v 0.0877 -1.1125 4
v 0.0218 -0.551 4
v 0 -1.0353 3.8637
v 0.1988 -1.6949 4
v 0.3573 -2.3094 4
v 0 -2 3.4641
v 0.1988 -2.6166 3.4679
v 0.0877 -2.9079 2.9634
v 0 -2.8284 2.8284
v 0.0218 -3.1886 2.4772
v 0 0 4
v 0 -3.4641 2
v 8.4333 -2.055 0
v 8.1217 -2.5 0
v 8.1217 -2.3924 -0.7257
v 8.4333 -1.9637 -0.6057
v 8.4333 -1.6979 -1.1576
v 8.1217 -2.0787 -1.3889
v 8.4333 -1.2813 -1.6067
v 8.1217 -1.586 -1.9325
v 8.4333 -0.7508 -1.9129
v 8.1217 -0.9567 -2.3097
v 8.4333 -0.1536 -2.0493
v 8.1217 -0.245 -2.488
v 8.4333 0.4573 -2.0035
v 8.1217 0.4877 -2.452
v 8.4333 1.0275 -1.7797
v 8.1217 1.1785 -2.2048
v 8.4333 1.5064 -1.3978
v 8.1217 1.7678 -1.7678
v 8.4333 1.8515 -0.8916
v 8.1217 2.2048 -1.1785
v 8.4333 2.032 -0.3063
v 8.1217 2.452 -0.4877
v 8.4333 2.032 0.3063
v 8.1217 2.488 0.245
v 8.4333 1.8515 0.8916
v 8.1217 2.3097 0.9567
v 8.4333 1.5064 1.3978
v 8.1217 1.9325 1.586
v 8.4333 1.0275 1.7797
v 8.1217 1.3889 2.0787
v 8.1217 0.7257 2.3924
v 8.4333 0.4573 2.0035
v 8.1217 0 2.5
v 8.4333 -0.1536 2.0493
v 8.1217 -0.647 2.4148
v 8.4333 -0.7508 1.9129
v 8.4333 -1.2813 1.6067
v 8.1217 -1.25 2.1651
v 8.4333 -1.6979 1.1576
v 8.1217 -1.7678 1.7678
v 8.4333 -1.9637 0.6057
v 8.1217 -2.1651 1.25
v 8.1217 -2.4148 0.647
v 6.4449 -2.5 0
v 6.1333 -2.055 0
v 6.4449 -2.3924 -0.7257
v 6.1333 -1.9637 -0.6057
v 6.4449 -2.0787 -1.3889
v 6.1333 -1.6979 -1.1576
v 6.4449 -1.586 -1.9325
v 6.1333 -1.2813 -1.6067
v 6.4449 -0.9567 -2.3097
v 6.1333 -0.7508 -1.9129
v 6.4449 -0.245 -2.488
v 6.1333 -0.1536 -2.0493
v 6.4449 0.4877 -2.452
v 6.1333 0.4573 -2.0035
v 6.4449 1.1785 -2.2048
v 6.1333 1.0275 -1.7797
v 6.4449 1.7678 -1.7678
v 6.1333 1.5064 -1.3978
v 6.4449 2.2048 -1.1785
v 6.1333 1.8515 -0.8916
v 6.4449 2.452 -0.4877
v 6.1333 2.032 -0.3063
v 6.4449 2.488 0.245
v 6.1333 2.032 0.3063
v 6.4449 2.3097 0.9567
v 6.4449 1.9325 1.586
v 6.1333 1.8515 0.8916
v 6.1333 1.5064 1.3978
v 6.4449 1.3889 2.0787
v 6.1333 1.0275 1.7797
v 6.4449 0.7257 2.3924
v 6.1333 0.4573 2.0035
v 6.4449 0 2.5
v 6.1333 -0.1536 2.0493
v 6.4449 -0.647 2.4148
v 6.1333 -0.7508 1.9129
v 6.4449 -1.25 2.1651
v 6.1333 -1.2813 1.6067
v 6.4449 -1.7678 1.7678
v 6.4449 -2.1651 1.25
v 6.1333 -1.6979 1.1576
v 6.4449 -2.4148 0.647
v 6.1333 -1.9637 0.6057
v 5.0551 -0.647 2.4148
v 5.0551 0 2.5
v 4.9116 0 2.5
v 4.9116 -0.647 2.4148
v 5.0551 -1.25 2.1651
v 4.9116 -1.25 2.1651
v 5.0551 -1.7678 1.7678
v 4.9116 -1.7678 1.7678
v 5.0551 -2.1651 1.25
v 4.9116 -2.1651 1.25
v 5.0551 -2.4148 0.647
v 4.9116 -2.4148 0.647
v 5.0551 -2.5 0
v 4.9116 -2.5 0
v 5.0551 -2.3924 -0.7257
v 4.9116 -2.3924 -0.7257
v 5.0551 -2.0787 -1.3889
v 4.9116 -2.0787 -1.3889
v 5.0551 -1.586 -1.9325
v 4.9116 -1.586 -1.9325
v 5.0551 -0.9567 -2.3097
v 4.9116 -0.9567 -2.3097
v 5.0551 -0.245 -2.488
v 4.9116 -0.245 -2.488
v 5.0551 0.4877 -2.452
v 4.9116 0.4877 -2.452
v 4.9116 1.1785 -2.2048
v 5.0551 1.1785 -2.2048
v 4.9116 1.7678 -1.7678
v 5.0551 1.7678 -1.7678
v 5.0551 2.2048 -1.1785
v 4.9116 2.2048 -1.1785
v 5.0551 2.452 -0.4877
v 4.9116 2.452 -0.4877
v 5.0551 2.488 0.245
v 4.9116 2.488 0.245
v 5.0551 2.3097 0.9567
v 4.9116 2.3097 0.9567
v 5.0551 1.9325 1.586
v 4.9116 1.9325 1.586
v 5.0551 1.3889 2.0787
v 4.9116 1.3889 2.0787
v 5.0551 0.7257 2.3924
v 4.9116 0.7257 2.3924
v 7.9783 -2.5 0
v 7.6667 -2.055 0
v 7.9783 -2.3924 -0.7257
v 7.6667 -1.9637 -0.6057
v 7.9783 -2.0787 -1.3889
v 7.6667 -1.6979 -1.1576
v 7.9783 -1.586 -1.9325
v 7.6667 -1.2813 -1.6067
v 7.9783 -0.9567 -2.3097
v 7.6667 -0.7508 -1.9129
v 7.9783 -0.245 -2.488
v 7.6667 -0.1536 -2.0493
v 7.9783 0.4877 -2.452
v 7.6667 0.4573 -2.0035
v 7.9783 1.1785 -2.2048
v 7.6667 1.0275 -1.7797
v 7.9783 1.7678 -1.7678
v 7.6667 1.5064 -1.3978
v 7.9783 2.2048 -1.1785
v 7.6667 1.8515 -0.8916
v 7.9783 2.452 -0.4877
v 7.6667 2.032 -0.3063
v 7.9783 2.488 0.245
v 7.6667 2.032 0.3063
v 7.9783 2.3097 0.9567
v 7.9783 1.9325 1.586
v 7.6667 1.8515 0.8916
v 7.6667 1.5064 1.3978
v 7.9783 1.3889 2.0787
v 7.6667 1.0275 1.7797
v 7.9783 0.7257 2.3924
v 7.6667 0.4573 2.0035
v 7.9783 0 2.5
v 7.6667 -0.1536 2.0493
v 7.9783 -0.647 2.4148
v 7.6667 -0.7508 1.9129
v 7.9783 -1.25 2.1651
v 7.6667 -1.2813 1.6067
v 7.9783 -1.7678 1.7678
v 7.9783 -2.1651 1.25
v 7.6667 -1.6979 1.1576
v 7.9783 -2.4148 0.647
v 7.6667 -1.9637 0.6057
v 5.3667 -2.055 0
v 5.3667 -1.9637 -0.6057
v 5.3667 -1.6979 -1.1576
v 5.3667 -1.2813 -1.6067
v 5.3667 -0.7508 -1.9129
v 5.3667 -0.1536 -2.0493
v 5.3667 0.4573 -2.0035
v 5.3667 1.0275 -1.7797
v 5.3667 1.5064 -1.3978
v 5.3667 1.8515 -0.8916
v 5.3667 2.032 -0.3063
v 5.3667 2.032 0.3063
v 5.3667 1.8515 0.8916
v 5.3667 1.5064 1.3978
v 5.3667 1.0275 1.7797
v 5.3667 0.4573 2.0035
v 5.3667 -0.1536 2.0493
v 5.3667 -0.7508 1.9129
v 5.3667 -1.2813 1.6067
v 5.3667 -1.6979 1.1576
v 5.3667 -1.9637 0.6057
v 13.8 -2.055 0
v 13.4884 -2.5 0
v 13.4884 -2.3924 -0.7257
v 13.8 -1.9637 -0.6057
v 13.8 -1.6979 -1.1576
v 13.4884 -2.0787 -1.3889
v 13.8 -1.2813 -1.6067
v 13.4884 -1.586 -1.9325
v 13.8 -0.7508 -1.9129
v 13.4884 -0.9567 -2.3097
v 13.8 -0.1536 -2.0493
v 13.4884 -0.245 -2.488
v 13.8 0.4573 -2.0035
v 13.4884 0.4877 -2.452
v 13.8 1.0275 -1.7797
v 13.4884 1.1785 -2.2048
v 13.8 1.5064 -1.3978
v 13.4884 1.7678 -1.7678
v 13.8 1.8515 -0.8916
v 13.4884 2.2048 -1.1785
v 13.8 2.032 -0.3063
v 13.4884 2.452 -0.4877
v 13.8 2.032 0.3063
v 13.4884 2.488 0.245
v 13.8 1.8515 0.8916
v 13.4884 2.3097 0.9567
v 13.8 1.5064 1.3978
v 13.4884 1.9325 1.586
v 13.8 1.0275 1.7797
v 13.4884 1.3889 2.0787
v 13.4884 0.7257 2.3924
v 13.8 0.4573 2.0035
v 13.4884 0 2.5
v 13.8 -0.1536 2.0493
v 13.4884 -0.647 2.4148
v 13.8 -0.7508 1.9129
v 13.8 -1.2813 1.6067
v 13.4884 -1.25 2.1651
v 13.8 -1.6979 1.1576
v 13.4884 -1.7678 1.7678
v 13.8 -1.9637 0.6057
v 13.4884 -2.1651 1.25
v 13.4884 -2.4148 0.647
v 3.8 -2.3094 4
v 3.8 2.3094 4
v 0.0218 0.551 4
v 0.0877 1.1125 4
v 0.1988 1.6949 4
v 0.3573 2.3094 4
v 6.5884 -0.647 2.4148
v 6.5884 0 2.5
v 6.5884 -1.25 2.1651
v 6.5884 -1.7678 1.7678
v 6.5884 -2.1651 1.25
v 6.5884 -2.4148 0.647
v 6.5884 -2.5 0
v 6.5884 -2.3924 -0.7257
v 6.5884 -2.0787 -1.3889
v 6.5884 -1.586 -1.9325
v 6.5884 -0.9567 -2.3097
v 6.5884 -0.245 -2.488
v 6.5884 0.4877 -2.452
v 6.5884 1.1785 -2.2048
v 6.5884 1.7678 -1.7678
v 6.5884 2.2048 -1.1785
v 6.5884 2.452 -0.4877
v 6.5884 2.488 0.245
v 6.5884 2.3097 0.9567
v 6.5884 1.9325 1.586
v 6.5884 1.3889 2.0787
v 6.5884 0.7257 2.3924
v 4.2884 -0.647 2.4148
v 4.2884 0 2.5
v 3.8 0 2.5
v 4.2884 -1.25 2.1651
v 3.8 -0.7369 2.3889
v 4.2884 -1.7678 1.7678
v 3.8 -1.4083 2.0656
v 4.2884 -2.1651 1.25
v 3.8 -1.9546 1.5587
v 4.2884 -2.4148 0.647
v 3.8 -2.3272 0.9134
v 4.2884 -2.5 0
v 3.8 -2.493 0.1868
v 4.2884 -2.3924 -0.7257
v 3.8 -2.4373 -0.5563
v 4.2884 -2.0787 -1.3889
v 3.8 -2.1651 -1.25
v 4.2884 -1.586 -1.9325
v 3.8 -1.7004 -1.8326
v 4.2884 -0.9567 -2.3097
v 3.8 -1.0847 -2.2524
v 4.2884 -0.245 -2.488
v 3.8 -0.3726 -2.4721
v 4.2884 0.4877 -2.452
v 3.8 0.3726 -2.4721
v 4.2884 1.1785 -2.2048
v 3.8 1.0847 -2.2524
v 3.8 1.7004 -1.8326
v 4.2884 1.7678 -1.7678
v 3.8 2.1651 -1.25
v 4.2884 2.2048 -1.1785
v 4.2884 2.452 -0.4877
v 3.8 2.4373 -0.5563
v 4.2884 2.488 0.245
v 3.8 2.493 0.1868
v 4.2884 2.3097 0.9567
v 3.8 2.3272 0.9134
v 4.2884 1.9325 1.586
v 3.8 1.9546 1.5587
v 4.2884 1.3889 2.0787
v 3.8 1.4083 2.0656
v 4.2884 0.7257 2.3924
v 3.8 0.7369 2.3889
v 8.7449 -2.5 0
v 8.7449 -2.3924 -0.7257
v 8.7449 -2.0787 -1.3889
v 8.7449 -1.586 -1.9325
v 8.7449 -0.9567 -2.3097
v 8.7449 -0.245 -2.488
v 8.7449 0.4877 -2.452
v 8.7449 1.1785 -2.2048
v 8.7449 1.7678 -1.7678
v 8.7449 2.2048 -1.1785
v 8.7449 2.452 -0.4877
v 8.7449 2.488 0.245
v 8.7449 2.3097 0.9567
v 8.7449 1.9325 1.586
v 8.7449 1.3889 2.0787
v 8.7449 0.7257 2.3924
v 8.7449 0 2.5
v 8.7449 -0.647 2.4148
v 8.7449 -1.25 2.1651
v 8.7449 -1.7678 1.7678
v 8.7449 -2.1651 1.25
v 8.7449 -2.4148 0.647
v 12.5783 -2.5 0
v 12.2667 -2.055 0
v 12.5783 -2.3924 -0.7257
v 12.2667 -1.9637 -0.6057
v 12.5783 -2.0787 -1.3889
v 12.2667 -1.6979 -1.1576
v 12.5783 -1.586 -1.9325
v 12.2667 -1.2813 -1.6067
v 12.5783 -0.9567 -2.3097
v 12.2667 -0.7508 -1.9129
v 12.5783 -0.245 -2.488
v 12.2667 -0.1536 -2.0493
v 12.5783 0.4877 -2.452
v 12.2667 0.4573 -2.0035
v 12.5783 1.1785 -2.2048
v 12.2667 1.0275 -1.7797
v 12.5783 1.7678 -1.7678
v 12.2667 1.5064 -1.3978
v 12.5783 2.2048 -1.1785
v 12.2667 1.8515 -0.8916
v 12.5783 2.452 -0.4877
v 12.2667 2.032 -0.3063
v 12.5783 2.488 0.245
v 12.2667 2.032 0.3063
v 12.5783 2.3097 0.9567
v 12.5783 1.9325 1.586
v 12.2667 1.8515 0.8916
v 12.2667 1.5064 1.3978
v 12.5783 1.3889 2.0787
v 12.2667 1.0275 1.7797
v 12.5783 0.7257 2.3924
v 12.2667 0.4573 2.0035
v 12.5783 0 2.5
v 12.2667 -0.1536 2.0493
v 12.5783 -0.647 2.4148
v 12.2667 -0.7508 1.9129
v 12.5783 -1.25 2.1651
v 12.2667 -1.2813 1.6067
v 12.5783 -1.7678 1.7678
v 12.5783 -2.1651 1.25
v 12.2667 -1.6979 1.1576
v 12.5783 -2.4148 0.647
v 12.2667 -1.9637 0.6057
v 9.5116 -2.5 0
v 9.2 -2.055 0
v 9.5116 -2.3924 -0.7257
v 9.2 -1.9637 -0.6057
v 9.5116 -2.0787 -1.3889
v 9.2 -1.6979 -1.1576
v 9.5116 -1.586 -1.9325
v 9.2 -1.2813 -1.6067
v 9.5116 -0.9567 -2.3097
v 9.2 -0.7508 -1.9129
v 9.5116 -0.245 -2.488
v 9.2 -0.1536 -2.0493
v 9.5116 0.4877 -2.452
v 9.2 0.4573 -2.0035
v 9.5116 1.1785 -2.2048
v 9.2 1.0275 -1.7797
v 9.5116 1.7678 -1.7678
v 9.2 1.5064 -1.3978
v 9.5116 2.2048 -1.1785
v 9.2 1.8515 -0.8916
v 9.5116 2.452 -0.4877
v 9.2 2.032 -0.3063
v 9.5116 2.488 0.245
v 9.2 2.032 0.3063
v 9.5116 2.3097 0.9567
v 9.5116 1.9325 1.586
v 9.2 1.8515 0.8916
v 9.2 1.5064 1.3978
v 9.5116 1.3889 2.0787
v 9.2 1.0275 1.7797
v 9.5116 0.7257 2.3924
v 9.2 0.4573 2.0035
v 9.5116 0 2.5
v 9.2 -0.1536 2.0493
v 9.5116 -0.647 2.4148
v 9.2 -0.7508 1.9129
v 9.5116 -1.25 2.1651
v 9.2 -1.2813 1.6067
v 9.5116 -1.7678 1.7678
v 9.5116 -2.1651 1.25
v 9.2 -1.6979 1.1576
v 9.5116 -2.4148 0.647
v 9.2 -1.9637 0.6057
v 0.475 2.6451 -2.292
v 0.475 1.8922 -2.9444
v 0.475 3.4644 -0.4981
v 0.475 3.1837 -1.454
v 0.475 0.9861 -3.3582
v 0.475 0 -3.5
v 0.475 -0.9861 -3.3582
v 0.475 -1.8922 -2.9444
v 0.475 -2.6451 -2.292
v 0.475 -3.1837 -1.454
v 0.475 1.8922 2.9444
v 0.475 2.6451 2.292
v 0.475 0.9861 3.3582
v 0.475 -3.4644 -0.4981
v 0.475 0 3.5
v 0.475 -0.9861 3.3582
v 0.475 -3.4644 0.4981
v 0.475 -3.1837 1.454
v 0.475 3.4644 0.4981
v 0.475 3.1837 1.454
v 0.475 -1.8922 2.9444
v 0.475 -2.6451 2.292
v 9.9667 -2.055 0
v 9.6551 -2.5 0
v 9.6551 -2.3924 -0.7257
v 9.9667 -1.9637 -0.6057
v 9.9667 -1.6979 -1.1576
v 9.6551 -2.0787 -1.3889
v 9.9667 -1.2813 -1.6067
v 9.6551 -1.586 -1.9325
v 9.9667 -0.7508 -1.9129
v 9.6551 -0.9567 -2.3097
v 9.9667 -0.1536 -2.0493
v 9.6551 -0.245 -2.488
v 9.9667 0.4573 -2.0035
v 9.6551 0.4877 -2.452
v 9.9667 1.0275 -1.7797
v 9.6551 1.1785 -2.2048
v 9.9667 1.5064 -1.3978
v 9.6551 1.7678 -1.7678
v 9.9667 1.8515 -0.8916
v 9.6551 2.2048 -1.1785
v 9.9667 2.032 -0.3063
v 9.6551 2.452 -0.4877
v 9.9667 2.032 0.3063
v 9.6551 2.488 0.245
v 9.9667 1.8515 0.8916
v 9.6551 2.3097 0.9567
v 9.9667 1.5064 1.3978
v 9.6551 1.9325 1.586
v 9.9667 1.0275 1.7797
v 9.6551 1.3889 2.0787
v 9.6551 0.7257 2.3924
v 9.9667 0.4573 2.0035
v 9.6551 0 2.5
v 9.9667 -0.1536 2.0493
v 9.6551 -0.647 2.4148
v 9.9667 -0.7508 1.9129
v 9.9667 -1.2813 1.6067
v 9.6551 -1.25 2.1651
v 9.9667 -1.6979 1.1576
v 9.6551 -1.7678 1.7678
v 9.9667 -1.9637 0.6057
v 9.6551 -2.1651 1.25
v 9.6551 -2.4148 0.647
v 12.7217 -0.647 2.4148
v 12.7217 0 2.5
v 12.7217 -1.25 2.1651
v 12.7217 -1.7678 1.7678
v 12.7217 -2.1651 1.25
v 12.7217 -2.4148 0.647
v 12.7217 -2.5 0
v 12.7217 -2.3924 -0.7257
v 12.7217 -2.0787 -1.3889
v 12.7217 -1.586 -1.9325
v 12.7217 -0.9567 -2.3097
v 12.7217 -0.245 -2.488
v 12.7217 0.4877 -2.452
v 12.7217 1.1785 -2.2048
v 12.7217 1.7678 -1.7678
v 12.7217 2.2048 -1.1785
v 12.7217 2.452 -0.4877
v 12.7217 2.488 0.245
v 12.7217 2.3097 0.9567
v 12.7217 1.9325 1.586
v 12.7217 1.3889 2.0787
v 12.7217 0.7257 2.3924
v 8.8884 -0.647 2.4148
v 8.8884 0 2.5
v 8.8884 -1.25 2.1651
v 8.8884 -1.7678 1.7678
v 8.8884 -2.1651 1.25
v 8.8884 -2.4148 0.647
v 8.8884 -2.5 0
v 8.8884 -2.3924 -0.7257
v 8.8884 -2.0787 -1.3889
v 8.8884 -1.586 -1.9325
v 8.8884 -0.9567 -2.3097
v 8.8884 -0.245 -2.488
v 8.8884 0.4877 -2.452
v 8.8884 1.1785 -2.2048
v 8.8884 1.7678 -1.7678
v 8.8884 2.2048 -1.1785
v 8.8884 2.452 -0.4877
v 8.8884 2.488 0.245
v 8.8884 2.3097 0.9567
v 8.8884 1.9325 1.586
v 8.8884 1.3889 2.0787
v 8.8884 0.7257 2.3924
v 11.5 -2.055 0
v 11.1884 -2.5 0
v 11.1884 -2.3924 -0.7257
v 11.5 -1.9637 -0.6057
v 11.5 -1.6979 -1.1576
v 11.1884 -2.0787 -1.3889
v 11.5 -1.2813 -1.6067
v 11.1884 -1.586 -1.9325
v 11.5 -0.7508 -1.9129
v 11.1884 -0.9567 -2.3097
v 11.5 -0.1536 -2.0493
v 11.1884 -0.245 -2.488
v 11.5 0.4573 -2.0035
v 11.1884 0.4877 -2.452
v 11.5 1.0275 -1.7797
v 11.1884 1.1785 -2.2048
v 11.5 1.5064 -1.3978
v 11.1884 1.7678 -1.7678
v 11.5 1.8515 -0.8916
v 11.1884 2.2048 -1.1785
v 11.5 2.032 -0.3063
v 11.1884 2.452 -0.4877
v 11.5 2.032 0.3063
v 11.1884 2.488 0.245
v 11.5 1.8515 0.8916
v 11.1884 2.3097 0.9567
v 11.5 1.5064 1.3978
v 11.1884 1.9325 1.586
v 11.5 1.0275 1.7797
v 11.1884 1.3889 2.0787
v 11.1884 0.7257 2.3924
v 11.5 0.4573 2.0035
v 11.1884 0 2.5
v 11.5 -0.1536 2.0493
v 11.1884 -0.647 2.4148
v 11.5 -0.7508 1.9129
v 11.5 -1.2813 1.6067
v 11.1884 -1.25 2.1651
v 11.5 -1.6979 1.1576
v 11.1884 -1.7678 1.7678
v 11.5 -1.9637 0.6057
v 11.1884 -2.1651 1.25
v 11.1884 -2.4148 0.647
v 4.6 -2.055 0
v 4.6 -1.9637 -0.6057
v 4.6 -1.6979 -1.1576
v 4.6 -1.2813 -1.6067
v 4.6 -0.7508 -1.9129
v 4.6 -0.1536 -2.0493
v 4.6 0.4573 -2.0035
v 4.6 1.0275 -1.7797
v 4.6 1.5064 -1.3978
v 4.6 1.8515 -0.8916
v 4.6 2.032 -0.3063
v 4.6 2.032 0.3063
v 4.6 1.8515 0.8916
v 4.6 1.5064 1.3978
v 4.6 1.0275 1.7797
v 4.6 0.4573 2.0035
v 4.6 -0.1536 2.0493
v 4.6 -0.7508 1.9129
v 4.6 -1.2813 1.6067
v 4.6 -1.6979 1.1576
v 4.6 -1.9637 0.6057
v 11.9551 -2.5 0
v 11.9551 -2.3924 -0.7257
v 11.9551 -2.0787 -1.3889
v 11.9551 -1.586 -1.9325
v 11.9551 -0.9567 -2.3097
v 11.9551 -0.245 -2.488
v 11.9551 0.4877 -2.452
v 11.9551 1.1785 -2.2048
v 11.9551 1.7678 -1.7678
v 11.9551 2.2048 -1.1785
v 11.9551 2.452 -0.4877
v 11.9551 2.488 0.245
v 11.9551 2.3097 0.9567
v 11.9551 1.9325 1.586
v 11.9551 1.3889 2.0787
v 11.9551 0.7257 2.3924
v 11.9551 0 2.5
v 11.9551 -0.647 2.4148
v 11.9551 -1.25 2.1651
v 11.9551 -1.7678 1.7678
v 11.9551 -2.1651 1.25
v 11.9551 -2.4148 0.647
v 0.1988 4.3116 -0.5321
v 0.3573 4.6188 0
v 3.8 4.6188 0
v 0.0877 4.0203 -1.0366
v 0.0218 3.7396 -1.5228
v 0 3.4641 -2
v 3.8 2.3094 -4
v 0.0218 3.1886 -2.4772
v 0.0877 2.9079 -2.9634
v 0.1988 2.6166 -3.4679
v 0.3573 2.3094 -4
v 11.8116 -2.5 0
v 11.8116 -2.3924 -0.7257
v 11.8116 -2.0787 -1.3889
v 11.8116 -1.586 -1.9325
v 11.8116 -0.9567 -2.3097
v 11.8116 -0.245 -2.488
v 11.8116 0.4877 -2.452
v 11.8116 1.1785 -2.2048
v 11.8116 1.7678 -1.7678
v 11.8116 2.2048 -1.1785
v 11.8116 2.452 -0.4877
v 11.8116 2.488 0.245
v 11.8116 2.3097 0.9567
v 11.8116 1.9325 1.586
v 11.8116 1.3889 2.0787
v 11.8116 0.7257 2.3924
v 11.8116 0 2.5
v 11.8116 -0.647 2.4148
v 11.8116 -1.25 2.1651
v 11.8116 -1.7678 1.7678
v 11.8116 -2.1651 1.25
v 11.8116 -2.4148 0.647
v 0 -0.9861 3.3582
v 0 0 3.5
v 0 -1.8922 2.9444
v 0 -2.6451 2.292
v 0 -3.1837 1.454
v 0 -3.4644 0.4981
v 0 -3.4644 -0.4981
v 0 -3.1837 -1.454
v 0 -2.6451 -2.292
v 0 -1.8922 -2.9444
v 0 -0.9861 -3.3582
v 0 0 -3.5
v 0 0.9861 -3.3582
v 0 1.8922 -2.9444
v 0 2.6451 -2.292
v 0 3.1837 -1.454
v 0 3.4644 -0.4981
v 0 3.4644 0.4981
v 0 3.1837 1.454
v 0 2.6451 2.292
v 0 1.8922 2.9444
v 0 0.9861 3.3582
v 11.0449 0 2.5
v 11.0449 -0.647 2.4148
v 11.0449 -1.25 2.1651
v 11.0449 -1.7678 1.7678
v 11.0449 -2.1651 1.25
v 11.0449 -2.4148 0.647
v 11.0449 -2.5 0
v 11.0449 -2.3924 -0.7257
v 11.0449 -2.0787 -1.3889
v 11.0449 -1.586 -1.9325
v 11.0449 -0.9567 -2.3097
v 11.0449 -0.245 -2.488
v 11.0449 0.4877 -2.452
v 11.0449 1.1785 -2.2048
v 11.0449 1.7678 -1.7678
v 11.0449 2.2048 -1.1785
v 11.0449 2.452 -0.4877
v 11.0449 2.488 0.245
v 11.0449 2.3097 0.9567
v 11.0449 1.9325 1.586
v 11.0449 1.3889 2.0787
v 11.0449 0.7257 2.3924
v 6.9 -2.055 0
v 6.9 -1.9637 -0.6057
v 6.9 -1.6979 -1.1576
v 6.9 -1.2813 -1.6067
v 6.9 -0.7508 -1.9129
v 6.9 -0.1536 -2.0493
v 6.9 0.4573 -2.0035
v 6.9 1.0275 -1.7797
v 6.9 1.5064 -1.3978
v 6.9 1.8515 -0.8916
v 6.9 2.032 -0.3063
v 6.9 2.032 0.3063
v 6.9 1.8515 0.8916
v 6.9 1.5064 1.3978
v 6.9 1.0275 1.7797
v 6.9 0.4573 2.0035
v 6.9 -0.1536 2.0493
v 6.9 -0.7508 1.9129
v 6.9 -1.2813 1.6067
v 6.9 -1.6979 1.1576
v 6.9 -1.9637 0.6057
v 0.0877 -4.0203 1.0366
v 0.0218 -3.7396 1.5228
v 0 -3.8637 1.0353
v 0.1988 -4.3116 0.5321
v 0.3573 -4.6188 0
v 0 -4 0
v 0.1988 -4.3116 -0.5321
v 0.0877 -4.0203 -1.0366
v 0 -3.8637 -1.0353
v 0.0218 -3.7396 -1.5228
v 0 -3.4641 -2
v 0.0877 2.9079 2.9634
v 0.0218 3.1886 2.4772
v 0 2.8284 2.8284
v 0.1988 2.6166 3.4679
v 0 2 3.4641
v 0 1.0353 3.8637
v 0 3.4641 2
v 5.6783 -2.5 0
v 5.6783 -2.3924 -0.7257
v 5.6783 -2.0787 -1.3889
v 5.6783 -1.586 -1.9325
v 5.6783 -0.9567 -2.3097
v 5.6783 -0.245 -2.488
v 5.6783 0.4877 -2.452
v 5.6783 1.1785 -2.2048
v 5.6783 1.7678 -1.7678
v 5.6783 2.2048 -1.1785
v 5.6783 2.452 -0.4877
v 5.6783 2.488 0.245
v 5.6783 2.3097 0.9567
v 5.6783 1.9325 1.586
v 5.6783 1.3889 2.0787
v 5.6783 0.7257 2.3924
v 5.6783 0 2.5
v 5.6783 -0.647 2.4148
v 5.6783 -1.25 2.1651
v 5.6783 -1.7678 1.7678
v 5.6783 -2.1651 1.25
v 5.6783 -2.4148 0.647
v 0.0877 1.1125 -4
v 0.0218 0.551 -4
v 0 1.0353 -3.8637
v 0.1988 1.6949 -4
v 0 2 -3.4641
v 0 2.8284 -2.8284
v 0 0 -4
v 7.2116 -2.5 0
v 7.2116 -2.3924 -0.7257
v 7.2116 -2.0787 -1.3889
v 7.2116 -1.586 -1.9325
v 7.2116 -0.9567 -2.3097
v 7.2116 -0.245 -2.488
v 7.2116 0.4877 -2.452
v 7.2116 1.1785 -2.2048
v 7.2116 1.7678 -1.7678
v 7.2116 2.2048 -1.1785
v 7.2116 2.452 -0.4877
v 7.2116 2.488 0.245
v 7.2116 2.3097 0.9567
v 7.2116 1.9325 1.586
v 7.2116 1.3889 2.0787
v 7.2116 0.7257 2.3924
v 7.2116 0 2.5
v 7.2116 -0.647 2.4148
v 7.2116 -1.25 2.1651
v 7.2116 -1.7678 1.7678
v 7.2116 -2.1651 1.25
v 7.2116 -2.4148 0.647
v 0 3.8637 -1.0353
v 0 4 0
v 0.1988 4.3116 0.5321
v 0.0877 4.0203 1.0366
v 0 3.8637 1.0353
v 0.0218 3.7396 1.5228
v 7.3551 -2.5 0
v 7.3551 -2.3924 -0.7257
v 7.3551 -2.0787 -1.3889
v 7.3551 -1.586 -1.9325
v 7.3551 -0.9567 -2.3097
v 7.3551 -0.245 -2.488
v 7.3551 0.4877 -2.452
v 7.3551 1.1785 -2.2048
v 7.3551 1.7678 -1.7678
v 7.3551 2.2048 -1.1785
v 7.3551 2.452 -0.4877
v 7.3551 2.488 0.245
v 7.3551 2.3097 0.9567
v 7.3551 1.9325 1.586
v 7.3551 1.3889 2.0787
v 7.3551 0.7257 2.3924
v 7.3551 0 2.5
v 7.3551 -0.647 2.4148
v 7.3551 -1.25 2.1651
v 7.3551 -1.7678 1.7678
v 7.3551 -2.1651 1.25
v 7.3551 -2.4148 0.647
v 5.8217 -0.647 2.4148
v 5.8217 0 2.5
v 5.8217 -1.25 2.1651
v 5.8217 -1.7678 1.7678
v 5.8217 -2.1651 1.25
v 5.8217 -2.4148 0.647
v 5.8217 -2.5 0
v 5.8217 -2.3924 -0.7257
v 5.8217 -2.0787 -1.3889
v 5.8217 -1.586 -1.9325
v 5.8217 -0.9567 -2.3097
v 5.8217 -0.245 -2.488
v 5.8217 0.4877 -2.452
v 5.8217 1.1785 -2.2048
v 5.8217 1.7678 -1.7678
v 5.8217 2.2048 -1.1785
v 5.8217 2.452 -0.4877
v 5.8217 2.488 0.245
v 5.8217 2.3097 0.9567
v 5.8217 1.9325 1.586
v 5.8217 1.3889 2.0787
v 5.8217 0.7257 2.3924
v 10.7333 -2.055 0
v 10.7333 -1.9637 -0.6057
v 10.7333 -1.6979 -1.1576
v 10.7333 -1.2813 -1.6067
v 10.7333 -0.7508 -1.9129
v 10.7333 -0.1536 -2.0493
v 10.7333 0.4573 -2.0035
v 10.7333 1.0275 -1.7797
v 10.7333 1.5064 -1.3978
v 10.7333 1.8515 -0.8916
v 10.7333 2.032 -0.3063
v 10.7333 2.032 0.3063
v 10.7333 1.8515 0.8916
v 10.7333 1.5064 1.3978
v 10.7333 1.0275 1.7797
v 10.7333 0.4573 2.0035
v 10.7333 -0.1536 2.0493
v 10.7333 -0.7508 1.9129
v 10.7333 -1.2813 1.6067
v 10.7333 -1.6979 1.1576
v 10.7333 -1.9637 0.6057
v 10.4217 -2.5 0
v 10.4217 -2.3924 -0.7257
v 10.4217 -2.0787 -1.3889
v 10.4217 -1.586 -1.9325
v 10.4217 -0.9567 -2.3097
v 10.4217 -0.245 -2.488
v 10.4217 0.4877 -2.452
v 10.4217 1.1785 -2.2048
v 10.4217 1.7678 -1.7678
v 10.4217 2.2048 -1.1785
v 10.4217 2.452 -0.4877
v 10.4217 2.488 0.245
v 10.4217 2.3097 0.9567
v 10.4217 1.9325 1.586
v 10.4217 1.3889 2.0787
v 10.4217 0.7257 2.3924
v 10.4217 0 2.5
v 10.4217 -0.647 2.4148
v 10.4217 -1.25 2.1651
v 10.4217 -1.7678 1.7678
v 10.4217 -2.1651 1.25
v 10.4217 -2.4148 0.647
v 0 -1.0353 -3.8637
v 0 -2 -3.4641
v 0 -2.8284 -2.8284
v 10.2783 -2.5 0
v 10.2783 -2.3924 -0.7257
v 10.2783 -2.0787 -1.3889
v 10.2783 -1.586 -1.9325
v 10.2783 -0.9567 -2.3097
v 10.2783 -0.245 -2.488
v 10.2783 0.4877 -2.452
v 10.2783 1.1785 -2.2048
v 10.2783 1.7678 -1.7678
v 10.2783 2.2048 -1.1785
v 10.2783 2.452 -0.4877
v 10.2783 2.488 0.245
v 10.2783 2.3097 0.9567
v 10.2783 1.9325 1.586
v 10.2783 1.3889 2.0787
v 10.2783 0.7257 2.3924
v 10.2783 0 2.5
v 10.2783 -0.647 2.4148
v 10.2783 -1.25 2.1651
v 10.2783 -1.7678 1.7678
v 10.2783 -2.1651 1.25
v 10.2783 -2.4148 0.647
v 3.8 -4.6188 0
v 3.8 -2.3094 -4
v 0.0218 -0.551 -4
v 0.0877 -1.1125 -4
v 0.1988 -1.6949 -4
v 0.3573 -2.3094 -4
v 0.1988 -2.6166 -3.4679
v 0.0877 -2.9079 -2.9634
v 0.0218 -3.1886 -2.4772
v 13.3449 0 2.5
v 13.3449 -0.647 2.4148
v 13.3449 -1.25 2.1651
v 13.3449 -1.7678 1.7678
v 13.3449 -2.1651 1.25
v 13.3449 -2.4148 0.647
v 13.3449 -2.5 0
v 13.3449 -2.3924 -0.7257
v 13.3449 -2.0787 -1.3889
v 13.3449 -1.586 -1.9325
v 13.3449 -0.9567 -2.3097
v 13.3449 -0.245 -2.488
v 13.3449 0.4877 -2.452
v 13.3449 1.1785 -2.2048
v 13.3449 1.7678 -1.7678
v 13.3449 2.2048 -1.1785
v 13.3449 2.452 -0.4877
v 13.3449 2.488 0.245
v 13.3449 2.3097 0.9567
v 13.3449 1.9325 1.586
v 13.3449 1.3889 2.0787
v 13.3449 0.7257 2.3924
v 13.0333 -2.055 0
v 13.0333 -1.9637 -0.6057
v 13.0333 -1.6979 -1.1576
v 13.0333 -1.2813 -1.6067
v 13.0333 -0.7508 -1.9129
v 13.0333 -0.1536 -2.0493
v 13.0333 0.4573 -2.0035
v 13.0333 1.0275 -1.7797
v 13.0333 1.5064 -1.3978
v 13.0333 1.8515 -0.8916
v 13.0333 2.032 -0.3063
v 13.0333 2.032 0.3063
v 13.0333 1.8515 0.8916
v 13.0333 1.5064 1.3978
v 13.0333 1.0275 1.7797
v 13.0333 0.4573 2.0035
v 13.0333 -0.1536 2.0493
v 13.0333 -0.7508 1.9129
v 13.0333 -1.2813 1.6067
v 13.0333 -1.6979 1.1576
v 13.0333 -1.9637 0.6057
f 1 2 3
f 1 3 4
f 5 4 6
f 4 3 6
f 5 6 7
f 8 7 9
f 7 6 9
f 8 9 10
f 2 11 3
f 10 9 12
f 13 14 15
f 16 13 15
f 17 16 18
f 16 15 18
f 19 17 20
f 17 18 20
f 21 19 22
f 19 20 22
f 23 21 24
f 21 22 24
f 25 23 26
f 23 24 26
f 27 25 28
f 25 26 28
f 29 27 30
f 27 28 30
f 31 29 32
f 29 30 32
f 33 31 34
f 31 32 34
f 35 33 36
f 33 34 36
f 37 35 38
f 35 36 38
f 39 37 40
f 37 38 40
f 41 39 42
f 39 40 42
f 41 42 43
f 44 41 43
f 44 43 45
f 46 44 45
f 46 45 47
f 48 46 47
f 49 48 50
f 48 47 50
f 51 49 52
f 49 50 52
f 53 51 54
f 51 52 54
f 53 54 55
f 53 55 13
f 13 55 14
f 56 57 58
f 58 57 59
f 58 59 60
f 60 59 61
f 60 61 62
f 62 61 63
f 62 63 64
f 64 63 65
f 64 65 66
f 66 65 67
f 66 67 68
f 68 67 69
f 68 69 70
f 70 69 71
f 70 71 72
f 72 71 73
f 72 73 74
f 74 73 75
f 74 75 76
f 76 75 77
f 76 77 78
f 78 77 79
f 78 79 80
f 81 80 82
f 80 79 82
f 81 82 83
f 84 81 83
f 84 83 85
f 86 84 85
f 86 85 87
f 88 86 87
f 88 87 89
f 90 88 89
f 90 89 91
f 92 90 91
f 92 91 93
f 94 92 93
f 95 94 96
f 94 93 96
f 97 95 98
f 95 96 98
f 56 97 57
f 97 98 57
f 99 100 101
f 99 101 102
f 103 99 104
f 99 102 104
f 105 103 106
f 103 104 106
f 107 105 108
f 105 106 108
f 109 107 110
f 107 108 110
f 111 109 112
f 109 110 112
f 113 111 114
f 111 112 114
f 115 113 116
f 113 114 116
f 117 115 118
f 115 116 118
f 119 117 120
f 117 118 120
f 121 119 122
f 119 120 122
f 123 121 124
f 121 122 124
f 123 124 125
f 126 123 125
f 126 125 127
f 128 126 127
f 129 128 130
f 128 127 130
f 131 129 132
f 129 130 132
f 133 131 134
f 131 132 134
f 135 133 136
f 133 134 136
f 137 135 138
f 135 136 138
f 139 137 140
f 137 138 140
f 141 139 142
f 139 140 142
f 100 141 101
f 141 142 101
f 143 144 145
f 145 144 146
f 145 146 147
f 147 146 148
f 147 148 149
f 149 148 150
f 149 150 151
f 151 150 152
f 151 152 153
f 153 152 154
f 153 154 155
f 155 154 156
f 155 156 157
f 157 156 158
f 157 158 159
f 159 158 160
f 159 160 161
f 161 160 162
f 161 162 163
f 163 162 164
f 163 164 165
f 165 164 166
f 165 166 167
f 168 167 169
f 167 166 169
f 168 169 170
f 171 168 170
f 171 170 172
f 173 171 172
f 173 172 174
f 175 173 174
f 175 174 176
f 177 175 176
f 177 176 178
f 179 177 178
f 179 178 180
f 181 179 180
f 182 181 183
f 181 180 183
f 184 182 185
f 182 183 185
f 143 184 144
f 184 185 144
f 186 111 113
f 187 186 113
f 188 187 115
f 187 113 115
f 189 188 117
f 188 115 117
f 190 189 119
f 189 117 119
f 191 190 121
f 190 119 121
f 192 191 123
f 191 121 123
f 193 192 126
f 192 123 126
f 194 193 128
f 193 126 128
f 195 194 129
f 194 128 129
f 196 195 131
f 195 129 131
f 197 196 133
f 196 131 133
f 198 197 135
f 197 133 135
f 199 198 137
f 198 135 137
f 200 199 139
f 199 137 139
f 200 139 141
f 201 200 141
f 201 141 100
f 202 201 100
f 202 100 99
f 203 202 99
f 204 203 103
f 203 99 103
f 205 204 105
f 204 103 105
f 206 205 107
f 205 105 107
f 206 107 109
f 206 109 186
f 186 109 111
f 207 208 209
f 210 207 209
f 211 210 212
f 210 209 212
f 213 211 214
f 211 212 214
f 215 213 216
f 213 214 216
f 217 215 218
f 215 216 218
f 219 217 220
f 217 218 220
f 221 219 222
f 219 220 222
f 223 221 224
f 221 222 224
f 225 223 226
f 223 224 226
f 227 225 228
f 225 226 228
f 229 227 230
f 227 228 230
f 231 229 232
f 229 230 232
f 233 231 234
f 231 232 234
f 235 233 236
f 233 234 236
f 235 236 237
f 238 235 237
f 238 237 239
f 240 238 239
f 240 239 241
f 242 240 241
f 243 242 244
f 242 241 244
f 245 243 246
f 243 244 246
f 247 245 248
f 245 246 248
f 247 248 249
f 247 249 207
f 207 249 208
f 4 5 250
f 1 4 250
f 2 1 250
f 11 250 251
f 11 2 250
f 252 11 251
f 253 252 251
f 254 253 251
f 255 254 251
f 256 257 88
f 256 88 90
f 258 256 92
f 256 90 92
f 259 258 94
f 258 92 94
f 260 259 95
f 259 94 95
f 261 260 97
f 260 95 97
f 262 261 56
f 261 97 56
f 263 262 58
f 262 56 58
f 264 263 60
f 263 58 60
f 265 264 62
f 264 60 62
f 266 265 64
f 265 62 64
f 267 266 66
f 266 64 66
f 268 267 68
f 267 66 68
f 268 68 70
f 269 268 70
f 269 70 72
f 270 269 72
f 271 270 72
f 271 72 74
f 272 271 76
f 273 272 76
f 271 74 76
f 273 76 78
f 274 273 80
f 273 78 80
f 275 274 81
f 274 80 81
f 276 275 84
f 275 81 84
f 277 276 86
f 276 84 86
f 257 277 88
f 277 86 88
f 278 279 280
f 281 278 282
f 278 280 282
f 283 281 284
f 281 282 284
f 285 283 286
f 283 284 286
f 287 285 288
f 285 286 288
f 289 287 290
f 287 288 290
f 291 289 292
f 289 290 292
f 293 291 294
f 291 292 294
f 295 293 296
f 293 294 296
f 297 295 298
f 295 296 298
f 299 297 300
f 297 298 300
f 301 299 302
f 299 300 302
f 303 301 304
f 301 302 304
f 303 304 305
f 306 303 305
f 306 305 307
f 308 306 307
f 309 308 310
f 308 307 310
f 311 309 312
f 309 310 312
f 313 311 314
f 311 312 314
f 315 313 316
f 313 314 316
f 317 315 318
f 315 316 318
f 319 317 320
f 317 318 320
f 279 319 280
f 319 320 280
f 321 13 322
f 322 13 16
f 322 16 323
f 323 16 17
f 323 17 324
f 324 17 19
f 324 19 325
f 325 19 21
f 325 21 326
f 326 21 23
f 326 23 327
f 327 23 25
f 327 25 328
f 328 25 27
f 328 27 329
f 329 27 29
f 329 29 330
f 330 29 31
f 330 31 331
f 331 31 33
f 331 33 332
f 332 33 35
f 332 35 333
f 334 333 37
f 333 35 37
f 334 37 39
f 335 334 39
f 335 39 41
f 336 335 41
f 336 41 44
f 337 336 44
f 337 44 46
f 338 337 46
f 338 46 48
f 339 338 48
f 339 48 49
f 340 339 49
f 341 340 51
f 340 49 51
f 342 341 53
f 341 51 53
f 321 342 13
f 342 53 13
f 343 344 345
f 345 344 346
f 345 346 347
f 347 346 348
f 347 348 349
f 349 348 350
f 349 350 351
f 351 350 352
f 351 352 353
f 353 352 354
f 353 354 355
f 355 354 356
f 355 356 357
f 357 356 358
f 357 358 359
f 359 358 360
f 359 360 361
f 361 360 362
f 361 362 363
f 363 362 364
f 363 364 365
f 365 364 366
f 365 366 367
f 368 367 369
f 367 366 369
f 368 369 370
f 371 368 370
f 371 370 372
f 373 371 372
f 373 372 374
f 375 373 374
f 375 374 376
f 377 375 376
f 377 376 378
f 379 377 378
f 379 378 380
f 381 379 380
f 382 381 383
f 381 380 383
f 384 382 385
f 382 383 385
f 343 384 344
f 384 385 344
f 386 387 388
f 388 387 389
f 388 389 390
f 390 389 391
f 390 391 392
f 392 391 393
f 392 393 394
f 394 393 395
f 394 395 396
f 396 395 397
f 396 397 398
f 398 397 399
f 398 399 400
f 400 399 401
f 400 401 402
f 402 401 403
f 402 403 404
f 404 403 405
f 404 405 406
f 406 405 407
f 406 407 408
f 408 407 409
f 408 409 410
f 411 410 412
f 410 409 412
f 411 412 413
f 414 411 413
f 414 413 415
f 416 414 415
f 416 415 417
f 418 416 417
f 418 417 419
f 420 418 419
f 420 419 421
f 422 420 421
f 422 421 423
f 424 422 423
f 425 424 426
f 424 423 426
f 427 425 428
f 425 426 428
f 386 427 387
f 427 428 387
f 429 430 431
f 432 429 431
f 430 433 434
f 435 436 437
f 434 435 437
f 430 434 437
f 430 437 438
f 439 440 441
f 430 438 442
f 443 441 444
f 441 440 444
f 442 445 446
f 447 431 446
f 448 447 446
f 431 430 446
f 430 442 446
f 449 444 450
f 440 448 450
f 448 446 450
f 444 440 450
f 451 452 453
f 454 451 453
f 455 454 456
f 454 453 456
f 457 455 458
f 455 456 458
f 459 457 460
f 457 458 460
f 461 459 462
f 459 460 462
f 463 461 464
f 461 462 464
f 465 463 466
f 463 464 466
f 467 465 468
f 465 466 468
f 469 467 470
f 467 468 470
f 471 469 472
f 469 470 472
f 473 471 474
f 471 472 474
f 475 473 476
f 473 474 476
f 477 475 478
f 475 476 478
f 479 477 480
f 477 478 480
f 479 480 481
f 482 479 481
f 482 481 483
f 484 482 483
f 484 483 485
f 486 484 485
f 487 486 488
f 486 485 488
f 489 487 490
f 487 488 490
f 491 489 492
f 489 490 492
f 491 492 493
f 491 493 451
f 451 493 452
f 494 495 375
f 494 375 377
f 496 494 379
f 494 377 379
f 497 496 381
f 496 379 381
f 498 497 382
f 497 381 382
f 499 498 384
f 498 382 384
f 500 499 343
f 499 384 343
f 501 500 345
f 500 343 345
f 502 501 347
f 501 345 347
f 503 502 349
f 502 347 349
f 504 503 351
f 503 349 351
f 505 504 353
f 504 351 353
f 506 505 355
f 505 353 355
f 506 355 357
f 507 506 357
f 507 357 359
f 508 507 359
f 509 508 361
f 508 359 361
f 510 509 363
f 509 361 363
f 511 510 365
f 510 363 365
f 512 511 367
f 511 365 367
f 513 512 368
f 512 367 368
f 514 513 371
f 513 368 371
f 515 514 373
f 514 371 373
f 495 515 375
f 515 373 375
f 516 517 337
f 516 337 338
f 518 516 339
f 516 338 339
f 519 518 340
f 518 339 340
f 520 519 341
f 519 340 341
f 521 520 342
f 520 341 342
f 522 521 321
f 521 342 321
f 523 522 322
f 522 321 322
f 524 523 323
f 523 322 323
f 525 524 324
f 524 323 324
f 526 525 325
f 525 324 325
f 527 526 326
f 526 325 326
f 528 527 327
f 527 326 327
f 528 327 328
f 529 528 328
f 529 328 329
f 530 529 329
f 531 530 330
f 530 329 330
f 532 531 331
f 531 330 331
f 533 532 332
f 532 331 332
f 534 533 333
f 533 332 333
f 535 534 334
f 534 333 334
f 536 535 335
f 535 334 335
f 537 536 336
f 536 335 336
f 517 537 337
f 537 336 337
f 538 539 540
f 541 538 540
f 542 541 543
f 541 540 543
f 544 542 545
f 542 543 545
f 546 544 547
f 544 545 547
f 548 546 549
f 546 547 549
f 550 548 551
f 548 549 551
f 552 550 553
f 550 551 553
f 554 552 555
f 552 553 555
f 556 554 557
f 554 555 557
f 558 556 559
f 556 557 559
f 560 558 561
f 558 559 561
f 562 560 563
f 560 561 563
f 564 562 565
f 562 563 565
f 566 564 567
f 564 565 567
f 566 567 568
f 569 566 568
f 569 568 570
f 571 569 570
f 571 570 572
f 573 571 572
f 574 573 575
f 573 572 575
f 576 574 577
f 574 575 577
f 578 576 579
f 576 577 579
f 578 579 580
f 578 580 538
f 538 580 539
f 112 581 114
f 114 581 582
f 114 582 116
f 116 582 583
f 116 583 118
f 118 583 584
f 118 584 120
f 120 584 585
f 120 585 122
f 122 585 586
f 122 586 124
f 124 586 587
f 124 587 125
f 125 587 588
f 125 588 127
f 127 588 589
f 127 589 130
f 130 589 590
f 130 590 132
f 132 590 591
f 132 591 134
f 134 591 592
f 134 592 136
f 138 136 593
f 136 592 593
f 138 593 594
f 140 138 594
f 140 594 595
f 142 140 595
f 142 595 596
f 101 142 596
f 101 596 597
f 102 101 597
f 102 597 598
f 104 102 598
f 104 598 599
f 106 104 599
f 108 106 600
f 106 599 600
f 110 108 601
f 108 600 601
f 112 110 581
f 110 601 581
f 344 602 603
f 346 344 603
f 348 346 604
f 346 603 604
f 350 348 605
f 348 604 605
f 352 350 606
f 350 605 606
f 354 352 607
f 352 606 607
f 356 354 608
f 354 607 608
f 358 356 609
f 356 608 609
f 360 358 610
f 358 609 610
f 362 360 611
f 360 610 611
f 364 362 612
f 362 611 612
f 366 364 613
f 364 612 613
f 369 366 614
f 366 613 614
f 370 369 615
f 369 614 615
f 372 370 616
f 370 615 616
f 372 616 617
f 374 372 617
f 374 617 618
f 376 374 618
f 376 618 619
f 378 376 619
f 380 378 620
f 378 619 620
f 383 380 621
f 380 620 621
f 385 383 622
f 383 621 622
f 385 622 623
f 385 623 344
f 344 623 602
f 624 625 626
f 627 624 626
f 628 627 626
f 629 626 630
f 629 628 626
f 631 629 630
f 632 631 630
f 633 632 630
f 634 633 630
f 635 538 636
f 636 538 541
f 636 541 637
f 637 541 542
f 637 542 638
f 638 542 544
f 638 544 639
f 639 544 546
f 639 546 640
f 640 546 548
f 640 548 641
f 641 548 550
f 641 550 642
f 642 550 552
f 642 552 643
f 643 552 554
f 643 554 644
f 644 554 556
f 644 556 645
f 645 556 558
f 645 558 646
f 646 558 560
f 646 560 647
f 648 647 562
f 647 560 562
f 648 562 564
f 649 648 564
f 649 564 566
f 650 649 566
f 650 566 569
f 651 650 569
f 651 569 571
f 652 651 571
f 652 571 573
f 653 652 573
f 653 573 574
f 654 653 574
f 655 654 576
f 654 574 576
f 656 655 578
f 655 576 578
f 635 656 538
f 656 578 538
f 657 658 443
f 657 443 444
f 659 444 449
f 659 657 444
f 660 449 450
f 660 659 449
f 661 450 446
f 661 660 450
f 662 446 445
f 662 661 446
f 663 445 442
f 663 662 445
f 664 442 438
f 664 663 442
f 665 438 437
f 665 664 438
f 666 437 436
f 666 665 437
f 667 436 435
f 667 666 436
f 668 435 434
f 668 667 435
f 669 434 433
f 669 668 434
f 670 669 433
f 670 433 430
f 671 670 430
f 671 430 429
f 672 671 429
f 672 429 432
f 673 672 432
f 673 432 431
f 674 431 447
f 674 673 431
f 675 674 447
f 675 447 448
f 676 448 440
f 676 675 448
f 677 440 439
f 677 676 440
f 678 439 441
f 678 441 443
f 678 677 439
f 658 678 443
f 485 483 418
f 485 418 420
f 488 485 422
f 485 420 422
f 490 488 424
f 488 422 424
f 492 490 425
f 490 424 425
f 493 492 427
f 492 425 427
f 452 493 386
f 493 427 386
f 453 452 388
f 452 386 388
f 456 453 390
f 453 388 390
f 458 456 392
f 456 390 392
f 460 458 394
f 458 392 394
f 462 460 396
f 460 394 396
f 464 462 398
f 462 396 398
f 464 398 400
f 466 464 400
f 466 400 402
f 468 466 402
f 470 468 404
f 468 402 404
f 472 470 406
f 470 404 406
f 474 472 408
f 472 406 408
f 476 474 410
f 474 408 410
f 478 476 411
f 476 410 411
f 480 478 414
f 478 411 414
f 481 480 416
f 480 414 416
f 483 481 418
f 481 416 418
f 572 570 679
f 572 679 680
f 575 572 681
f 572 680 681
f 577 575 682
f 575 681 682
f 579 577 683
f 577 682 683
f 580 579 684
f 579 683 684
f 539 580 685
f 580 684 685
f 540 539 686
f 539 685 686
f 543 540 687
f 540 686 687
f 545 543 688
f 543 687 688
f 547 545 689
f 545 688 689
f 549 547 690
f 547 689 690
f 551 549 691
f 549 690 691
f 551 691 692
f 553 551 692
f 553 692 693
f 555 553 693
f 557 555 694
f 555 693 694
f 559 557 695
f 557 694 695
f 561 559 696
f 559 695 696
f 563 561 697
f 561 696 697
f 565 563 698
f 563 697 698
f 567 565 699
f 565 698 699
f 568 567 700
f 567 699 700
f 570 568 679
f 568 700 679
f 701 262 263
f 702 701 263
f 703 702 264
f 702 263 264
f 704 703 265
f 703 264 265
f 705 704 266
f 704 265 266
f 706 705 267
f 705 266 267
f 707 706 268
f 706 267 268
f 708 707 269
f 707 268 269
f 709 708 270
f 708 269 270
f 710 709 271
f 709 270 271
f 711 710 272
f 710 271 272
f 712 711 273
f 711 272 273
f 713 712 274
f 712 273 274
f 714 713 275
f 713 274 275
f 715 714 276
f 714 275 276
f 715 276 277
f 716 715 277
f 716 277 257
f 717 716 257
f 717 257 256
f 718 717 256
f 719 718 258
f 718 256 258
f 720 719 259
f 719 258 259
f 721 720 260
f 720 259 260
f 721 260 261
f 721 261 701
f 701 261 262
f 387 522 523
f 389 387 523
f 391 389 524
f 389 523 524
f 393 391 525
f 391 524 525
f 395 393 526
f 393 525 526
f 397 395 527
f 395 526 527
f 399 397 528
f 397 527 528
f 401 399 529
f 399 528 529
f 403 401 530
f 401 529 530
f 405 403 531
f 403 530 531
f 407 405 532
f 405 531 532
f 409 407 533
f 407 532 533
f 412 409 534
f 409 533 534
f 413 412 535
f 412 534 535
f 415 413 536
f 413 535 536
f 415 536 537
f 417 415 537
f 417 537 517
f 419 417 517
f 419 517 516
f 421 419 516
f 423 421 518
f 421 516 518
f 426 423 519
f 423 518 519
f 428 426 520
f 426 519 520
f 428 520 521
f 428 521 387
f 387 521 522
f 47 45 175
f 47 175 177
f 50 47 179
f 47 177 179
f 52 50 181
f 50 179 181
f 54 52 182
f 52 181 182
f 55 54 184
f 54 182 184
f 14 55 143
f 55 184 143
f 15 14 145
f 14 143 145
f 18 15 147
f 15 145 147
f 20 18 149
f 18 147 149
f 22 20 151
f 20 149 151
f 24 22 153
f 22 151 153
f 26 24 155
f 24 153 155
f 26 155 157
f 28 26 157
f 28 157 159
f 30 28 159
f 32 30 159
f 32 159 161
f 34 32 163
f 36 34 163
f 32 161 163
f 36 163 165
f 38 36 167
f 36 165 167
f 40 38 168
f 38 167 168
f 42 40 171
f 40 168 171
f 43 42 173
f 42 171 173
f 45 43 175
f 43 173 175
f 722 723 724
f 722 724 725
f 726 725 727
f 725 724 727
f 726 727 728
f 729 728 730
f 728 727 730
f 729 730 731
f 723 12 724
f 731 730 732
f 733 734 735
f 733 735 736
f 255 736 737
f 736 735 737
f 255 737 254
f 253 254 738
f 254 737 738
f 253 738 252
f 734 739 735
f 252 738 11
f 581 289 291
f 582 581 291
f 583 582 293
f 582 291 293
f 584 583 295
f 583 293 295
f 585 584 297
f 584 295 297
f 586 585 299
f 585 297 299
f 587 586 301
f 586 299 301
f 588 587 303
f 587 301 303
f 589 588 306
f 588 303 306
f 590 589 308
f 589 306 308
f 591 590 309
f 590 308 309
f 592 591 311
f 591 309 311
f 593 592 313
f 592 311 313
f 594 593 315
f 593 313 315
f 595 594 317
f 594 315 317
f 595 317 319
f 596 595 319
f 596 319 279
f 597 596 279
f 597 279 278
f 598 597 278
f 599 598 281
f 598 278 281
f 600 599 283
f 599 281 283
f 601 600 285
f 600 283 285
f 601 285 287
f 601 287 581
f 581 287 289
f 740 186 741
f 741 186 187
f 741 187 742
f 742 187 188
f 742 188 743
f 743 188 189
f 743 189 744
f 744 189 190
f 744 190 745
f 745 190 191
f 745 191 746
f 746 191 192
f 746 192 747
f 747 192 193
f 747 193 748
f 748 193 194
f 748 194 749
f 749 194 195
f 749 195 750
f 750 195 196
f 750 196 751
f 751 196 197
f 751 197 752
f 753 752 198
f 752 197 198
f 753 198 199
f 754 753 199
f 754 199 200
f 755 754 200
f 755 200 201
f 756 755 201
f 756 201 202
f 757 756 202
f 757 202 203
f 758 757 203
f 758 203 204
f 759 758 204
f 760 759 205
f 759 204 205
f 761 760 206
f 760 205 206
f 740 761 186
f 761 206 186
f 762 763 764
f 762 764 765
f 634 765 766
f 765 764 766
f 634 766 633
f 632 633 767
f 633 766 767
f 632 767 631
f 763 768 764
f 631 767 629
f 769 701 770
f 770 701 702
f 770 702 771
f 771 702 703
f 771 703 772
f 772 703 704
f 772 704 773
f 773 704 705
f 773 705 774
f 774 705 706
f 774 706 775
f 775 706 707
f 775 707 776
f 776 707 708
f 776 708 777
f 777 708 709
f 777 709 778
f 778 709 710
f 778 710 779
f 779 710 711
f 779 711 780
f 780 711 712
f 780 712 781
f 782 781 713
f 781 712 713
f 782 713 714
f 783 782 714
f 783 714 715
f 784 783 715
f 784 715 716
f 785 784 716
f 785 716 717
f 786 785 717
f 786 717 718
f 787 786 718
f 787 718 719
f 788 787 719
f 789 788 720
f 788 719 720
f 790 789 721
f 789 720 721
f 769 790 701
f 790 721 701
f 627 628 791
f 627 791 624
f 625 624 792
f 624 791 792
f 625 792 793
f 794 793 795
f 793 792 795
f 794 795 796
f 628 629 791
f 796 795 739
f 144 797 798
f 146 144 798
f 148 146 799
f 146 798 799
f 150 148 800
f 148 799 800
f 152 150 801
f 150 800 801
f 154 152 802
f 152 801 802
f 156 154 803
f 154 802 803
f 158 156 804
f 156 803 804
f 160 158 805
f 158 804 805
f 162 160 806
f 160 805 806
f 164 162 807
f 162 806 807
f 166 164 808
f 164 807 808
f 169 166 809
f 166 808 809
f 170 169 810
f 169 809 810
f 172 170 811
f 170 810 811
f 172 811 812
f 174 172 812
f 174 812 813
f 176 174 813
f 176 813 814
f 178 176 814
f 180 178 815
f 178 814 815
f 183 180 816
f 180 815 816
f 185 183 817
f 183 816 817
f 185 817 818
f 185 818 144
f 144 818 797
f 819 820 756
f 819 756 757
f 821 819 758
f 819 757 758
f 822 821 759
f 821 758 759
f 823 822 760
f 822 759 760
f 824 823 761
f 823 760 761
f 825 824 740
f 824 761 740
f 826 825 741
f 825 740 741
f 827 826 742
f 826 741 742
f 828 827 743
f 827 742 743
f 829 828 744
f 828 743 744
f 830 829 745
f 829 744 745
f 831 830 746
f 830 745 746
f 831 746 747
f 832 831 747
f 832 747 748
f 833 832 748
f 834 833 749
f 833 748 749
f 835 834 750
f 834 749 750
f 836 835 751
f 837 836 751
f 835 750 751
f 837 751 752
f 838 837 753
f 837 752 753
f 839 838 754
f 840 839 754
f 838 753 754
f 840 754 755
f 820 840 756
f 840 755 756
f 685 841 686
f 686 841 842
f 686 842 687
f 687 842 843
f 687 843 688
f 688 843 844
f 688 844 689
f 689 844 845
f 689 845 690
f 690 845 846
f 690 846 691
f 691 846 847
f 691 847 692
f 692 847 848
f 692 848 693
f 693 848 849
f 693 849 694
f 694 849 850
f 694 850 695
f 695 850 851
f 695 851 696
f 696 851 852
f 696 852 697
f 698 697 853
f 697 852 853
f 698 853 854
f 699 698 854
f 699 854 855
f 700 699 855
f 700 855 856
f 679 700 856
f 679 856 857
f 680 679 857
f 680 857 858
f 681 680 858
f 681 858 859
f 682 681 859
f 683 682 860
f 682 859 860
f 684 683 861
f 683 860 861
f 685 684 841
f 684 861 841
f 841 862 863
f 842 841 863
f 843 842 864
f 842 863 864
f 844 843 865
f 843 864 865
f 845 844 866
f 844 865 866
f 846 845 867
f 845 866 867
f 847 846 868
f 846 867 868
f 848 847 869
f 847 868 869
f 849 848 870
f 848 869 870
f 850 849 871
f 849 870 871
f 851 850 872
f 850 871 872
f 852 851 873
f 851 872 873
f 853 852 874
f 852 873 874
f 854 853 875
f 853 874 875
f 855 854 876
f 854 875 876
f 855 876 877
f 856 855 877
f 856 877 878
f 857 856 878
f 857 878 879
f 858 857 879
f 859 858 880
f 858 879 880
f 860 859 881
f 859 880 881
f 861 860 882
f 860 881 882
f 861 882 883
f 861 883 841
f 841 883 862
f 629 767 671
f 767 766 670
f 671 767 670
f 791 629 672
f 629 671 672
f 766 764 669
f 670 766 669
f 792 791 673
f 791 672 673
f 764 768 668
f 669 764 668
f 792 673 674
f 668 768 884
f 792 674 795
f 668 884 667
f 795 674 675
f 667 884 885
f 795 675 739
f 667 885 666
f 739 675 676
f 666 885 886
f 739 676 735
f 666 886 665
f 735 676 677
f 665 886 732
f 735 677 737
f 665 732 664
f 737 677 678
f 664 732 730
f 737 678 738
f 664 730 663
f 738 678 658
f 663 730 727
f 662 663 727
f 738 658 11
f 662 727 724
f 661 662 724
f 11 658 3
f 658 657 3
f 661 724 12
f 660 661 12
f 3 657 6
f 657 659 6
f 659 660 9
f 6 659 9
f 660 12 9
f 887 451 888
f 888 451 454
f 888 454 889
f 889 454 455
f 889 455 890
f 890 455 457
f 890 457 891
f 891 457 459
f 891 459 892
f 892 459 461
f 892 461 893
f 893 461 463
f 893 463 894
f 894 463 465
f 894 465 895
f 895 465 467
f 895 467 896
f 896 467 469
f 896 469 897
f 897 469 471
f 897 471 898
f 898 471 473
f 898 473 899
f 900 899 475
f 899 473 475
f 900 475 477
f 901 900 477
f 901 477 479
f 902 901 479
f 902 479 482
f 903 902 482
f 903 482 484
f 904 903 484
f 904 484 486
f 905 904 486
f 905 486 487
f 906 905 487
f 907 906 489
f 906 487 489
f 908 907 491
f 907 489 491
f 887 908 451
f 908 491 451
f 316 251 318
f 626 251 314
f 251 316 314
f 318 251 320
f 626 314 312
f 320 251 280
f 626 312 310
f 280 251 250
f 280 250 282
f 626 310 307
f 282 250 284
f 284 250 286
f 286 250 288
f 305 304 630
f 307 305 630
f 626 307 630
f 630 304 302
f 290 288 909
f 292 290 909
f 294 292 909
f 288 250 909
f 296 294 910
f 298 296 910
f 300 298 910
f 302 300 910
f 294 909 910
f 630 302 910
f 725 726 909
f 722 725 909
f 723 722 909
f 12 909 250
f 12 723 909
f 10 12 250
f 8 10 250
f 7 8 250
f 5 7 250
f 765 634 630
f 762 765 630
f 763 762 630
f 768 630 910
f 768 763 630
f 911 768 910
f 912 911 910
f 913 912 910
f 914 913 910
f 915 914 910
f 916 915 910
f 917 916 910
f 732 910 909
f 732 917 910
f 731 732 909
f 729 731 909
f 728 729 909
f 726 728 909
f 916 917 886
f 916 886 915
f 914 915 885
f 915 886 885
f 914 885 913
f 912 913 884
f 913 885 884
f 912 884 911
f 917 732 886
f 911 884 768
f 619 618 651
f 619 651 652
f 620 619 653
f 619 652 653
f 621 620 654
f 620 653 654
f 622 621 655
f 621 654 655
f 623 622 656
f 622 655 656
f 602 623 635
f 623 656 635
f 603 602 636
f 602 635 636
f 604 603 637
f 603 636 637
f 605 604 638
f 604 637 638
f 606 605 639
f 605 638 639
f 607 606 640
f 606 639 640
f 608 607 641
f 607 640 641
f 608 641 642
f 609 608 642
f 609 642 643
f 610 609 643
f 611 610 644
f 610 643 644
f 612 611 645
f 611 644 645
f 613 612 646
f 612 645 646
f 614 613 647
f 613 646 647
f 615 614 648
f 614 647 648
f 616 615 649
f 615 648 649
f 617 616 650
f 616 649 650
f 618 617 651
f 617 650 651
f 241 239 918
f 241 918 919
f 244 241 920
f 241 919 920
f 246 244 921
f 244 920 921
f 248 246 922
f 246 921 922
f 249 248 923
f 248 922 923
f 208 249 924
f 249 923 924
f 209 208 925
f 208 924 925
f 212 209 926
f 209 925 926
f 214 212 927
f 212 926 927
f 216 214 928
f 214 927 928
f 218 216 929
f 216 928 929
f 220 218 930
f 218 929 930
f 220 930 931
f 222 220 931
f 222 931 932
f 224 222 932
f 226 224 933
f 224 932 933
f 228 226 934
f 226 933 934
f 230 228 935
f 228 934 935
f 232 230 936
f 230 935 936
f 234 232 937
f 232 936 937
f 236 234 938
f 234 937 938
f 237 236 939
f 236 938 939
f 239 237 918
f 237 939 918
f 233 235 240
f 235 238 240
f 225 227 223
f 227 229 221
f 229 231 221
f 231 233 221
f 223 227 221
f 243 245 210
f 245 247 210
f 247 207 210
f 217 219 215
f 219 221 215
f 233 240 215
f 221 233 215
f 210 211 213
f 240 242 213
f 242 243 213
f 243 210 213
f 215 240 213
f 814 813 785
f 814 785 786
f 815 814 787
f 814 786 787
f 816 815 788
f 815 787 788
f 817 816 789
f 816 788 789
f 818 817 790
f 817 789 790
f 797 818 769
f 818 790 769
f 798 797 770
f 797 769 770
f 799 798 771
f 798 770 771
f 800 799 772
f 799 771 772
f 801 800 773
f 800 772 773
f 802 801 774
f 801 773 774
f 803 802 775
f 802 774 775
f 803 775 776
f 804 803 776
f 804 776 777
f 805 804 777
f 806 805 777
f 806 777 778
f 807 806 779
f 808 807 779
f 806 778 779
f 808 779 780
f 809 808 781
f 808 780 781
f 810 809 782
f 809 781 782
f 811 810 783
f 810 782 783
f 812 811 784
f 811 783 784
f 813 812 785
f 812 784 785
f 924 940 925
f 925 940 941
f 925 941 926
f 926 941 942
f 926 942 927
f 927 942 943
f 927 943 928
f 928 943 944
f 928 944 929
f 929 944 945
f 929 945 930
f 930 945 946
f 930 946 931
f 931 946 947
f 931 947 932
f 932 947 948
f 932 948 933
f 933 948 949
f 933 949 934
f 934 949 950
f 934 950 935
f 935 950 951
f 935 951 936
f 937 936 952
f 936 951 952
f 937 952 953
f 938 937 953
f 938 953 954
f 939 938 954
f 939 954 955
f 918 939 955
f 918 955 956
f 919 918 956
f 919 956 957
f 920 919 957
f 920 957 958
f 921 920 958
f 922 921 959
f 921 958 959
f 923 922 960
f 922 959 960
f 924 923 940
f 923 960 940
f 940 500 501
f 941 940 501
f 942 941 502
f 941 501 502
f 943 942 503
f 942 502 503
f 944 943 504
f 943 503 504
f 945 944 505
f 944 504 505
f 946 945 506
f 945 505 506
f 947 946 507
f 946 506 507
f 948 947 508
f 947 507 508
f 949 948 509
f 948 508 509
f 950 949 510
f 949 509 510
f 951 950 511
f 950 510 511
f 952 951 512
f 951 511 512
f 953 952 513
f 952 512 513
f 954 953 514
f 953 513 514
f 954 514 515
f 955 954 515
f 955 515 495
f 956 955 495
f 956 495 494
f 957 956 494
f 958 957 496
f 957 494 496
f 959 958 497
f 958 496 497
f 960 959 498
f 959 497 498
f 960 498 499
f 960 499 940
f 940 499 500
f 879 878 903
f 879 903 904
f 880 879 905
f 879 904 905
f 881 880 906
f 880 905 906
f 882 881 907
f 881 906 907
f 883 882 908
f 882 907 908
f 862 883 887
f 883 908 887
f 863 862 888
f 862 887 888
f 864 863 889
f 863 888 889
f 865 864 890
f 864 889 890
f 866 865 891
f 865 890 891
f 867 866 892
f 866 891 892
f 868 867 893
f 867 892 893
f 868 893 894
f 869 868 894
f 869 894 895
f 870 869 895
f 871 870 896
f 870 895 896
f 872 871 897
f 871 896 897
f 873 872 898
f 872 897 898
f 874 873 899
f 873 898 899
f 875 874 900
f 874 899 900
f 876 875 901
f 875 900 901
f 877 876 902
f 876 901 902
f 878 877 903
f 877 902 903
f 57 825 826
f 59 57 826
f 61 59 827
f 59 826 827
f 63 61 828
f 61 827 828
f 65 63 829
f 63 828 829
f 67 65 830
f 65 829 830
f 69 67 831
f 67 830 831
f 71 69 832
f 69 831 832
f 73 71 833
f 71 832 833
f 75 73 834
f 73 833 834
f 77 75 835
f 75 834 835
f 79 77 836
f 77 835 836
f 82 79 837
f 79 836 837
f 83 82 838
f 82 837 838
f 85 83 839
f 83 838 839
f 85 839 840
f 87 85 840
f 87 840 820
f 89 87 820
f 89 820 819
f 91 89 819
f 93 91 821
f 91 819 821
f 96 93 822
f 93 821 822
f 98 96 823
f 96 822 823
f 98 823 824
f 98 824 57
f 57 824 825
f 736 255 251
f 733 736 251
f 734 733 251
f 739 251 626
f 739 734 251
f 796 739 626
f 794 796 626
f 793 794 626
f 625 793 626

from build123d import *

# Parameters (mm, degrees)
SKETCH2_R       = 4.665127021
HEX_DIE_DEPTH   = 3.8
SKETCH4_R       = 3.5
INDENT_DEPTH    = 0.475
THDSCHPAT_COUNT = 13
THDSCHPAT_PITCH = 0.766666667


with BuildPart() as part:
    # BodySke → Base-Revolve (revolve)
    with BuildSketch(Plane.XY, mode=Mode.PRIVATE) as base_revolve_sk:
        Polygon((3.8, 2.5), (3.8, 4.618937644), (0.357343816, 4.618937644), (0, 4), (0, 0), (13.8, 0), (13.8, 2.5), align=None)
    revolve(base_revolve_sk.sketch.rotate(Axis((-25.4, 0, 0), (1, 0, 0)), 90), axis=Axis((-25.4, 0, 0), (1, 0, 0)))

    # Sketch2 → Hex-Die (cut)
    with BuildSketch(Plane(origin=(0, 0, 0), x_dir=(0, 0, -1), z_dir=(1, 0, 0))):
        Circle(SKETCH2_R)
        Polygon((-4, 2.309401087), (0, 4.618802174), (4, 2.309401087), (4, -2.309401087), (0, -4.618802174), (-4, -2.309401087), align=None, mode=Mode.SUBTRACT)
    extrude(amount=HEX_DIE_DEPTH, mode=Mode.SUBTRACT)

    # Sketch4 → Indent (cut)
    with BuildSketch(Plane(origin=(0, 0, 0), x_dir=(0, 0, -1), z_dir=(1, 0, 0))):
        with Locations(Location((0, 0, 0), (0, 0, 180))):
            Circle(SKETCH4_R)
    extrude(amount=INDENT_DEPTH, mode=Mode.SUBTRACT)

    # ThdSchSke → ThreadSchematic (revolve, cut)
    with BuildSketch(Plane.XY):
        Polygon((4.6, -2.055), (4.288407645, -2.5), (4.288407645, -3.125), (4.911592355, -3.125), (4.911592355, -2.5), align=None)
    threadschematic = revolve(axis=Axis((-3.175, 0, 0), (1, 0, 0)), mode=Mode.SUBTRACT)

    # ThdSchPat: ThreadSchematic ×13
    with Locations(*[(i * THDSCHPAT_PITCH, 0, 0) for i in range(1, THDSCHPAT_COUNT)]):
        add(threadschematic, mode=Mode.SUBTRACT)


solid = part.part
